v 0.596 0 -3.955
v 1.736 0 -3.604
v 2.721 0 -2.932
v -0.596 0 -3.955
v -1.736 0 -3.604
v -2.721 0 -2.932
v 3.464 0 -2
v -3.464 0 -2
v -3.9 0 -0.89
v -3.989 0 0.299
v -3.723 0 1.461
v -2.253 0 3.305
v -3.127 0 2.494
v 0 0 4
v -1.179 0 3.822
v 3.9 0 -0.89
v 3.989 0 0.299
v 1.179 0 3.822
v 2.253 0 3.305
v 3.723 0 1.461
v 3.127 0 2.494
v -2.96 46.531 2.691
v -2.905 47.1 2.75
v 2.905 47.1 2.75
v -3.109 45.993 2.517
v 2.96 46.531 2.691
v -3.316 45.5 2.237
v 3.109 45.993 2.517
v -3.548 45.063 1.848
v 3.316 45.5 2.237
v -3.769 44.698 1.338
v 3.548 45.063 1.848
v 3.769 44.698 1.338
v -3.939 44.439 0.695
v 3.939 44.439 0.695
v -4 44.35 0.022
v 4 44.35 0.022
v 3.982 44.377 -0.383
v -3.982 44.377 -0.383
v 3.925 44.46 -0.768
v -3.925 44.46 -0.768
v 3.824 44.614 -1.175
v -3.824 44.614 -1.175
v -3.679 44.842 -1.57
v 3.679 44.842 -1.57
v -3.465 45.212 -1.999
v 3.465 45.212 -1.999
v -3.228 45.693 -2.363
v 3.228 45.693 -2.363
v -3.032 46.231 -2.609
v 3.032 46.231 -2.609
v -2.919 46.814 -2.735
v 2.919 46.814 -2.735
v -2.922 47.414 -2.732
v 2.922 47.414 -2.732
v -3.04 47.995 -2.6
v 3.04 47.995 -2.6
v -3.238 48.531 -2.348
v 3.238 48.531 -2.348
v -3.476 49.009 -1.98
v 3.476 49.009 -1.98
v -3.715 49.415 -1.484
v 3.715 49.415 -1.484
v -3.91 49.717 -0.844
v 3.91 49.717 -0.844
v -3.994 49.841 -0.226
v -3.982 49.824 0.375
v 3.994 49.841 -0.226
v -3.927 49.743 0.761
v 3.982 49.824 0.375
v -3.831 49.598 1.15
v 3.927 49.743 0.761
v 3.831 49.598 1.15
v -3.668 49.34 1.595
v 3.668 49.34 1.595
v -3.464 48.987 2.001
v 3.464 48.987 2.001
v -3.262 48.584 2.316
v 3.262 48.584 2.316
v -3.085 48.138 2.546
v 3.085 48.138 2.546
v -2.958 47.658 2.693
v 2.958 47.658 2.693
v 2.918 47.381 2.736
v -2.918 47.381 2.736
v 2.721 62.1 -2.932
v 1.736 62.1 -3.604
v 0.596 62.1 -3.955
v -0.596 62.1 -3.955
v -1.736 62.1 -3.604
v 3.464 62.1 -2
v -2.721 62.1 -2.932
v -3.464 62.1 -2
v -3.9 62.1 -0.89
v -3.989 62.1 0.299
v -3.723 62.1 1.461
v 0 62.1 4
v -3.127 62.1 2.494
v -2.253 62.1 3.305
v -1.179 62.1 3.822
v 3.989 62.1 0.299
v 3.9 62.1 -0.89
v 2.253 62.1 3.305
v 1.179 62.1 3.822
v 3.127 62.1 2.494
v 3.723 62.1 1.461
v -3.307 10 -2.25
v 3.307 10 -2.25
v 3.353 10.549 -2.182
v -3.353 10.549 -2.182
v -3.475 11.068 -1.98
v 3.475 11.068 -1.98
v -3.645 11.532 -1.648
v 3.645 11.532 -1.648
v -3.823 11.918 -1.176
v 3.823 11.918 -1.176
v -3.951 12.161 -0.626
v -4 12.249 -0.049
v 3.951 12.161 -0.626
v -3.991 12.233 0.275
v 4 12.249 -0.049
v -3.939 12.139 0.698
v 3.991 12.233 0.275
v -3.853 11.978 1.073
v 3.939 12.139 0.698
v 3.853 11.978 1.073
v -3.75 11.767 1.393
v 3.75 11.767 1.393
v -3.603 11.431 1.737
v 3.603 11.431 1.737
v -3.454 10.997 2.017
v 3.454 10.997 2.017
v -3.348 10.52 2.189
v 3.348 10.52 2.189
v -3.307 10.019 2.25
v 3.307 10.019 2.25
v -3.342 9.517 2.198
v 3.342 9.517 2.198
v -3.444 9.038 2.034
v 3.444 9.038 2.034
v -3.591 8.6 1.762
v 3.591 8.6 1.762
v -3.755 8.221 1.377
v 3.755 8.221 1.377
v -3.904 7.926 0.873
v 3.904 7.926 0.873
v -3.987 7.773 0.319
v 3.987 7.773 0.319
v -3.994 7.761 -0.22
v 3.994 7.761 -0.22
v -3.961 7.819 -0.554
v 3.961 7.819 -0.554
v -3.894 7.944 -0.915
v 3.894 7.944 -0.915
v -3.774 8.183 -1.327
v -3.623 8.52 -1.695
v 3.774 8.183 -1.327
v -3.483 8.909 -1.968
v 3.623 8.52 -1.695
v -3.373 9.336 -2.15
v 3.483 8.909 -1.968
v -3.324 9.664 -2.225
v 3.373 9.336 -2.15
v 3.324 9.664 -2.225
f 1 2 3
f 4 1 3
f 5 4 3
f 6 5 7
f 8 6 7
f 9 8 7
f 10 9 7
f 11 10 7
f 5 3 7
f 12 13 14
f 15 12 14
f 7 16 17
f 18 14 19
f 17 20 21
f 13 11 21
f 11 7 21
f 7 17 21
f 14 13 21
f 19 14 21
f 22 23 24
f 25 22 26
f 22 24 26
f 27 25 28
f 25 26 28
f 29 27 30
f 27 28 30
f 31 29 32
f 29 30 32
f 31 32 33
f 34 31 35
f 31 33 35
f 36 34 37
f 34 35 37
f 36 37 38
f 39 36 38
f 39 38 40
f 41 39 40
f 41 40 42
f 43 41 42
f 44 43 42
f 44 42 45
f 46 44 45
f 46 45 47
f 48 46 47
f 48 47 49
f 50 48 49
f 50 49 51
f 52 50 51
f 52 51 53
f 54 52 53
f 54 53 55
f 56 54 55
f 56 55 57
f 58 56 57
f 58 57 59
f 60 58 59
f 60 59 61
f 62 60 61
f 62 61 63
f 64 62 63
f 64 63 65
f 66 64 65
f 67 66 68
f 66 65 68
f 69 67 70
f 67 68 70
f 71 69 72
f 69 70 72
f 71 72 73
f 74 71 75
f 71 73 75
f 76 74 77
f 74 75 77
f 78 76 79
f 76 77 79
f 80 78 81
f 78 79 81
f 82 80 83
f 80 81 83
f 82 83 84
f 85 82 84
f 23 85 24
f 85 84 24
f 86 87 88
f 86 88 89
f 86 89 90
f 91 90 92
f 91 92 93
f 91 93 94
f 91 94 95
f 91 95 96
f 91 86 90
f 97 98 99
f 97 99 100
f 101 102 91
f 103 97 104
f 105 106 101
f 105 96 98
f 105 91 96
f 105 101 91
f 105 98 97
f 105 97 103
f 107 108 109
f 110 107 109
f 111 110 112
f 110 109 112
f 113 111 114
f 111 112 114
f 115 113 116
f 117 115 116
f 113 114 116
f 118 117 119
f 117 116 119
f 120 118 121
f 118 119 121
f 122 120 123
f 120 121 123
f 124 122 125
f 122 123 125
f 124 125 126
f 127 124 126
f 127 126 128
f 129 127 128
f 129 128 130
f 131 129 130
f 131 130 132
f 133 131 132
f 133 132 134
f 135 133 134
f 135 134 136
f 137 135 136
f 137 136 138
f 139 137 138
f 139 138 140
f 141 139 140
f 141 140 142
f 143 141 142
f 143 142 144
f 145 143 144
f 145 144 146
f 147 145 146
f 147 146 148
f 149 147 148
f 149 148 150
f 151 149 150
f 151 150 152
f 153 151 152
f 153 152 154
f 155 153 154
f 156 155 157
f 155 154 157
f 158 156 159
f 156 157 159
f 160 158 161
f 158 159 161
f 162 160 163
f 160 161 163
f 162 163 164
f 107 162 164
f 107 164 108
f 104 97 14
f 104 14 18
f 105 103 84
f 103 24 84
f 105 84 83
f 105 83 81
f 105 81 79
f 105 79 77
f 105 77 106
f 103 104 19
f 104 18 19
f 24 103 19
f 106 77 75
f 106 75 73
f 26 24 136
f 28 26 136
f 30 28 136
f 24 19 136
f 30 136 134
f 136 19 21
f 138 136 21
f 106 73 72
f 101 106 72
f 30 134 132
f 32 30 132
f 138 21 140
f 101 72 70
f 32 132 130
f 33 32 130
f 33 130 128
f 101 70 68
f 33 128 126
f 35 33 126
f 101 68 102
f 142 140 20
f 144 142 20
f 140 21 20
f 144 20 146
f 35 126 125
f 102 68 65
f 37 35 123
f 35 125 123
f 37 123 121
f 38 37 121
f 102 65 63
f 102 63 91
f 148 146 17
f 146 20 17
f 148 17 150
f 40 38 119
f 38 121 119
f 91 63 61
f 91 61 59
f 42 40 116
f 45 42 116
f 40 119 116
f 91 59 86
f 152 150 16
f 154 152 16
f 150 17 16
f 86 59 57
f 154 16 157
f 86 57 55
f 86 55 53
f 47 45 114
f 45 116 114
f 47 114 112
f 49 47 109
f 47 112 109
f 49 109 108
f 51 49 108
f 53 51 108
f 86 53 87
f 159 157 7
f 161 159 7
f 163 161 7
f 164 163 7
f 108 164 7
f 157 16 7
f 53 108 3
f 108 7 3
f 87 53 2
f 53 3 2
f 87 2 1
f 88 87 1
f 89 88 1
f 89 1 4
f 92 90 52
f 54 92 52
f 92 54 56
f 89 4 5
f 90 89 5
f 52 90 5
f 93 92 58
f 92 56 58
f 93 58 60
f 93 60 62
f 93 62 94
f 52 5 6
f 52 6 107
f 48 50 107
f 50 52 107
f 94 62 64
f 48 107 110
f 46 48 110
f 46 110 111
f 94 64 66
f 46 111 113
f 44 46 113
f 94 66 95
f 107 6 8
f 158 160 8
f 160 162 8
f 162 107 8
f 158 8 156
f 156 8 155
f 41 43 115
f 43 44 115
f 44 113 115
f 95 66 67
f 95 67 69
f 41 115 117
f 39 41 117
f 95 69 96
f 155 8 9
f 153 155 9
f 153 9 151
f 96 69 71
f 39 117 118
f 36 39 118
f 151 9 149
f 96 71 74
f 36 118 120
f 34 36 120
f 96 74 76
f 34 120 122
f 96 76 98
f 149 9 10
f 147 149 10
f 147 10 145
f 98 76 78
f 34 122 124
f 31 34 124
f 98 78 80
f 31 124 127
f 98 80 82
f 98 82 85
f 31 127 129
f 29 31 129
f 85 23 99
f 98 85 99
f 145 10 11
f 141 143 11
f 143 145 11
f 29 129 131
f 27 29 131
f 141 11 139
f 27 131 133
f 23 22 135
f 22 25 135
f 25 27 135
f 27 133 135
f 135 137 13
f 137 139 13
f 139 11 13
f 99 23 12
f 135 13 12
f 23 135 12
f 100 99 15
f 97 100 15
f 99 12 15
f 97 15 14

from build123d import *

# Parameters (mm, degrees)
SKETCH1_R            = 4
BOSS_EXTRUDE1_DEPTH  = 62.1
M5_CLEARANCE_HOLE1_D = 5.5
M4_CLEARANCE_HOLE1_D = 4.5


with BuildPart() as part:
    # Sketch1 → Boss-Extrude1 (new body)
    with BuildSketch(Plane(origin=(0, 0, 0), x_dir=(1, 0, 0), z_dir=(0, 1, 0))):
        with Locations(Location((0, 0, 0), (0, 0, 270))):
            Circle(SKETCH1_R)
    extrude(amount=BOSS_EXTRUDE1_DEPTH)

    # M5 Clearance Hole1 (through all)
    with Locations(Plane(origin=(-4, 0, 0), x_dir=(0, 0, -1), z_dir=(-1, 0, 0))):
        with Locations((0, -47.1)):
            Hole(M5_CLEARANCE_HOLE1_D / 2)

    # M4 Clearance Hole1 (through all)
    with Locations(Plane.ZY.offset(4)):
        with Locations((0, 10)):
            Hole(M4_CLEARANCE_HOLE1_D / 2)


solid = part.part
